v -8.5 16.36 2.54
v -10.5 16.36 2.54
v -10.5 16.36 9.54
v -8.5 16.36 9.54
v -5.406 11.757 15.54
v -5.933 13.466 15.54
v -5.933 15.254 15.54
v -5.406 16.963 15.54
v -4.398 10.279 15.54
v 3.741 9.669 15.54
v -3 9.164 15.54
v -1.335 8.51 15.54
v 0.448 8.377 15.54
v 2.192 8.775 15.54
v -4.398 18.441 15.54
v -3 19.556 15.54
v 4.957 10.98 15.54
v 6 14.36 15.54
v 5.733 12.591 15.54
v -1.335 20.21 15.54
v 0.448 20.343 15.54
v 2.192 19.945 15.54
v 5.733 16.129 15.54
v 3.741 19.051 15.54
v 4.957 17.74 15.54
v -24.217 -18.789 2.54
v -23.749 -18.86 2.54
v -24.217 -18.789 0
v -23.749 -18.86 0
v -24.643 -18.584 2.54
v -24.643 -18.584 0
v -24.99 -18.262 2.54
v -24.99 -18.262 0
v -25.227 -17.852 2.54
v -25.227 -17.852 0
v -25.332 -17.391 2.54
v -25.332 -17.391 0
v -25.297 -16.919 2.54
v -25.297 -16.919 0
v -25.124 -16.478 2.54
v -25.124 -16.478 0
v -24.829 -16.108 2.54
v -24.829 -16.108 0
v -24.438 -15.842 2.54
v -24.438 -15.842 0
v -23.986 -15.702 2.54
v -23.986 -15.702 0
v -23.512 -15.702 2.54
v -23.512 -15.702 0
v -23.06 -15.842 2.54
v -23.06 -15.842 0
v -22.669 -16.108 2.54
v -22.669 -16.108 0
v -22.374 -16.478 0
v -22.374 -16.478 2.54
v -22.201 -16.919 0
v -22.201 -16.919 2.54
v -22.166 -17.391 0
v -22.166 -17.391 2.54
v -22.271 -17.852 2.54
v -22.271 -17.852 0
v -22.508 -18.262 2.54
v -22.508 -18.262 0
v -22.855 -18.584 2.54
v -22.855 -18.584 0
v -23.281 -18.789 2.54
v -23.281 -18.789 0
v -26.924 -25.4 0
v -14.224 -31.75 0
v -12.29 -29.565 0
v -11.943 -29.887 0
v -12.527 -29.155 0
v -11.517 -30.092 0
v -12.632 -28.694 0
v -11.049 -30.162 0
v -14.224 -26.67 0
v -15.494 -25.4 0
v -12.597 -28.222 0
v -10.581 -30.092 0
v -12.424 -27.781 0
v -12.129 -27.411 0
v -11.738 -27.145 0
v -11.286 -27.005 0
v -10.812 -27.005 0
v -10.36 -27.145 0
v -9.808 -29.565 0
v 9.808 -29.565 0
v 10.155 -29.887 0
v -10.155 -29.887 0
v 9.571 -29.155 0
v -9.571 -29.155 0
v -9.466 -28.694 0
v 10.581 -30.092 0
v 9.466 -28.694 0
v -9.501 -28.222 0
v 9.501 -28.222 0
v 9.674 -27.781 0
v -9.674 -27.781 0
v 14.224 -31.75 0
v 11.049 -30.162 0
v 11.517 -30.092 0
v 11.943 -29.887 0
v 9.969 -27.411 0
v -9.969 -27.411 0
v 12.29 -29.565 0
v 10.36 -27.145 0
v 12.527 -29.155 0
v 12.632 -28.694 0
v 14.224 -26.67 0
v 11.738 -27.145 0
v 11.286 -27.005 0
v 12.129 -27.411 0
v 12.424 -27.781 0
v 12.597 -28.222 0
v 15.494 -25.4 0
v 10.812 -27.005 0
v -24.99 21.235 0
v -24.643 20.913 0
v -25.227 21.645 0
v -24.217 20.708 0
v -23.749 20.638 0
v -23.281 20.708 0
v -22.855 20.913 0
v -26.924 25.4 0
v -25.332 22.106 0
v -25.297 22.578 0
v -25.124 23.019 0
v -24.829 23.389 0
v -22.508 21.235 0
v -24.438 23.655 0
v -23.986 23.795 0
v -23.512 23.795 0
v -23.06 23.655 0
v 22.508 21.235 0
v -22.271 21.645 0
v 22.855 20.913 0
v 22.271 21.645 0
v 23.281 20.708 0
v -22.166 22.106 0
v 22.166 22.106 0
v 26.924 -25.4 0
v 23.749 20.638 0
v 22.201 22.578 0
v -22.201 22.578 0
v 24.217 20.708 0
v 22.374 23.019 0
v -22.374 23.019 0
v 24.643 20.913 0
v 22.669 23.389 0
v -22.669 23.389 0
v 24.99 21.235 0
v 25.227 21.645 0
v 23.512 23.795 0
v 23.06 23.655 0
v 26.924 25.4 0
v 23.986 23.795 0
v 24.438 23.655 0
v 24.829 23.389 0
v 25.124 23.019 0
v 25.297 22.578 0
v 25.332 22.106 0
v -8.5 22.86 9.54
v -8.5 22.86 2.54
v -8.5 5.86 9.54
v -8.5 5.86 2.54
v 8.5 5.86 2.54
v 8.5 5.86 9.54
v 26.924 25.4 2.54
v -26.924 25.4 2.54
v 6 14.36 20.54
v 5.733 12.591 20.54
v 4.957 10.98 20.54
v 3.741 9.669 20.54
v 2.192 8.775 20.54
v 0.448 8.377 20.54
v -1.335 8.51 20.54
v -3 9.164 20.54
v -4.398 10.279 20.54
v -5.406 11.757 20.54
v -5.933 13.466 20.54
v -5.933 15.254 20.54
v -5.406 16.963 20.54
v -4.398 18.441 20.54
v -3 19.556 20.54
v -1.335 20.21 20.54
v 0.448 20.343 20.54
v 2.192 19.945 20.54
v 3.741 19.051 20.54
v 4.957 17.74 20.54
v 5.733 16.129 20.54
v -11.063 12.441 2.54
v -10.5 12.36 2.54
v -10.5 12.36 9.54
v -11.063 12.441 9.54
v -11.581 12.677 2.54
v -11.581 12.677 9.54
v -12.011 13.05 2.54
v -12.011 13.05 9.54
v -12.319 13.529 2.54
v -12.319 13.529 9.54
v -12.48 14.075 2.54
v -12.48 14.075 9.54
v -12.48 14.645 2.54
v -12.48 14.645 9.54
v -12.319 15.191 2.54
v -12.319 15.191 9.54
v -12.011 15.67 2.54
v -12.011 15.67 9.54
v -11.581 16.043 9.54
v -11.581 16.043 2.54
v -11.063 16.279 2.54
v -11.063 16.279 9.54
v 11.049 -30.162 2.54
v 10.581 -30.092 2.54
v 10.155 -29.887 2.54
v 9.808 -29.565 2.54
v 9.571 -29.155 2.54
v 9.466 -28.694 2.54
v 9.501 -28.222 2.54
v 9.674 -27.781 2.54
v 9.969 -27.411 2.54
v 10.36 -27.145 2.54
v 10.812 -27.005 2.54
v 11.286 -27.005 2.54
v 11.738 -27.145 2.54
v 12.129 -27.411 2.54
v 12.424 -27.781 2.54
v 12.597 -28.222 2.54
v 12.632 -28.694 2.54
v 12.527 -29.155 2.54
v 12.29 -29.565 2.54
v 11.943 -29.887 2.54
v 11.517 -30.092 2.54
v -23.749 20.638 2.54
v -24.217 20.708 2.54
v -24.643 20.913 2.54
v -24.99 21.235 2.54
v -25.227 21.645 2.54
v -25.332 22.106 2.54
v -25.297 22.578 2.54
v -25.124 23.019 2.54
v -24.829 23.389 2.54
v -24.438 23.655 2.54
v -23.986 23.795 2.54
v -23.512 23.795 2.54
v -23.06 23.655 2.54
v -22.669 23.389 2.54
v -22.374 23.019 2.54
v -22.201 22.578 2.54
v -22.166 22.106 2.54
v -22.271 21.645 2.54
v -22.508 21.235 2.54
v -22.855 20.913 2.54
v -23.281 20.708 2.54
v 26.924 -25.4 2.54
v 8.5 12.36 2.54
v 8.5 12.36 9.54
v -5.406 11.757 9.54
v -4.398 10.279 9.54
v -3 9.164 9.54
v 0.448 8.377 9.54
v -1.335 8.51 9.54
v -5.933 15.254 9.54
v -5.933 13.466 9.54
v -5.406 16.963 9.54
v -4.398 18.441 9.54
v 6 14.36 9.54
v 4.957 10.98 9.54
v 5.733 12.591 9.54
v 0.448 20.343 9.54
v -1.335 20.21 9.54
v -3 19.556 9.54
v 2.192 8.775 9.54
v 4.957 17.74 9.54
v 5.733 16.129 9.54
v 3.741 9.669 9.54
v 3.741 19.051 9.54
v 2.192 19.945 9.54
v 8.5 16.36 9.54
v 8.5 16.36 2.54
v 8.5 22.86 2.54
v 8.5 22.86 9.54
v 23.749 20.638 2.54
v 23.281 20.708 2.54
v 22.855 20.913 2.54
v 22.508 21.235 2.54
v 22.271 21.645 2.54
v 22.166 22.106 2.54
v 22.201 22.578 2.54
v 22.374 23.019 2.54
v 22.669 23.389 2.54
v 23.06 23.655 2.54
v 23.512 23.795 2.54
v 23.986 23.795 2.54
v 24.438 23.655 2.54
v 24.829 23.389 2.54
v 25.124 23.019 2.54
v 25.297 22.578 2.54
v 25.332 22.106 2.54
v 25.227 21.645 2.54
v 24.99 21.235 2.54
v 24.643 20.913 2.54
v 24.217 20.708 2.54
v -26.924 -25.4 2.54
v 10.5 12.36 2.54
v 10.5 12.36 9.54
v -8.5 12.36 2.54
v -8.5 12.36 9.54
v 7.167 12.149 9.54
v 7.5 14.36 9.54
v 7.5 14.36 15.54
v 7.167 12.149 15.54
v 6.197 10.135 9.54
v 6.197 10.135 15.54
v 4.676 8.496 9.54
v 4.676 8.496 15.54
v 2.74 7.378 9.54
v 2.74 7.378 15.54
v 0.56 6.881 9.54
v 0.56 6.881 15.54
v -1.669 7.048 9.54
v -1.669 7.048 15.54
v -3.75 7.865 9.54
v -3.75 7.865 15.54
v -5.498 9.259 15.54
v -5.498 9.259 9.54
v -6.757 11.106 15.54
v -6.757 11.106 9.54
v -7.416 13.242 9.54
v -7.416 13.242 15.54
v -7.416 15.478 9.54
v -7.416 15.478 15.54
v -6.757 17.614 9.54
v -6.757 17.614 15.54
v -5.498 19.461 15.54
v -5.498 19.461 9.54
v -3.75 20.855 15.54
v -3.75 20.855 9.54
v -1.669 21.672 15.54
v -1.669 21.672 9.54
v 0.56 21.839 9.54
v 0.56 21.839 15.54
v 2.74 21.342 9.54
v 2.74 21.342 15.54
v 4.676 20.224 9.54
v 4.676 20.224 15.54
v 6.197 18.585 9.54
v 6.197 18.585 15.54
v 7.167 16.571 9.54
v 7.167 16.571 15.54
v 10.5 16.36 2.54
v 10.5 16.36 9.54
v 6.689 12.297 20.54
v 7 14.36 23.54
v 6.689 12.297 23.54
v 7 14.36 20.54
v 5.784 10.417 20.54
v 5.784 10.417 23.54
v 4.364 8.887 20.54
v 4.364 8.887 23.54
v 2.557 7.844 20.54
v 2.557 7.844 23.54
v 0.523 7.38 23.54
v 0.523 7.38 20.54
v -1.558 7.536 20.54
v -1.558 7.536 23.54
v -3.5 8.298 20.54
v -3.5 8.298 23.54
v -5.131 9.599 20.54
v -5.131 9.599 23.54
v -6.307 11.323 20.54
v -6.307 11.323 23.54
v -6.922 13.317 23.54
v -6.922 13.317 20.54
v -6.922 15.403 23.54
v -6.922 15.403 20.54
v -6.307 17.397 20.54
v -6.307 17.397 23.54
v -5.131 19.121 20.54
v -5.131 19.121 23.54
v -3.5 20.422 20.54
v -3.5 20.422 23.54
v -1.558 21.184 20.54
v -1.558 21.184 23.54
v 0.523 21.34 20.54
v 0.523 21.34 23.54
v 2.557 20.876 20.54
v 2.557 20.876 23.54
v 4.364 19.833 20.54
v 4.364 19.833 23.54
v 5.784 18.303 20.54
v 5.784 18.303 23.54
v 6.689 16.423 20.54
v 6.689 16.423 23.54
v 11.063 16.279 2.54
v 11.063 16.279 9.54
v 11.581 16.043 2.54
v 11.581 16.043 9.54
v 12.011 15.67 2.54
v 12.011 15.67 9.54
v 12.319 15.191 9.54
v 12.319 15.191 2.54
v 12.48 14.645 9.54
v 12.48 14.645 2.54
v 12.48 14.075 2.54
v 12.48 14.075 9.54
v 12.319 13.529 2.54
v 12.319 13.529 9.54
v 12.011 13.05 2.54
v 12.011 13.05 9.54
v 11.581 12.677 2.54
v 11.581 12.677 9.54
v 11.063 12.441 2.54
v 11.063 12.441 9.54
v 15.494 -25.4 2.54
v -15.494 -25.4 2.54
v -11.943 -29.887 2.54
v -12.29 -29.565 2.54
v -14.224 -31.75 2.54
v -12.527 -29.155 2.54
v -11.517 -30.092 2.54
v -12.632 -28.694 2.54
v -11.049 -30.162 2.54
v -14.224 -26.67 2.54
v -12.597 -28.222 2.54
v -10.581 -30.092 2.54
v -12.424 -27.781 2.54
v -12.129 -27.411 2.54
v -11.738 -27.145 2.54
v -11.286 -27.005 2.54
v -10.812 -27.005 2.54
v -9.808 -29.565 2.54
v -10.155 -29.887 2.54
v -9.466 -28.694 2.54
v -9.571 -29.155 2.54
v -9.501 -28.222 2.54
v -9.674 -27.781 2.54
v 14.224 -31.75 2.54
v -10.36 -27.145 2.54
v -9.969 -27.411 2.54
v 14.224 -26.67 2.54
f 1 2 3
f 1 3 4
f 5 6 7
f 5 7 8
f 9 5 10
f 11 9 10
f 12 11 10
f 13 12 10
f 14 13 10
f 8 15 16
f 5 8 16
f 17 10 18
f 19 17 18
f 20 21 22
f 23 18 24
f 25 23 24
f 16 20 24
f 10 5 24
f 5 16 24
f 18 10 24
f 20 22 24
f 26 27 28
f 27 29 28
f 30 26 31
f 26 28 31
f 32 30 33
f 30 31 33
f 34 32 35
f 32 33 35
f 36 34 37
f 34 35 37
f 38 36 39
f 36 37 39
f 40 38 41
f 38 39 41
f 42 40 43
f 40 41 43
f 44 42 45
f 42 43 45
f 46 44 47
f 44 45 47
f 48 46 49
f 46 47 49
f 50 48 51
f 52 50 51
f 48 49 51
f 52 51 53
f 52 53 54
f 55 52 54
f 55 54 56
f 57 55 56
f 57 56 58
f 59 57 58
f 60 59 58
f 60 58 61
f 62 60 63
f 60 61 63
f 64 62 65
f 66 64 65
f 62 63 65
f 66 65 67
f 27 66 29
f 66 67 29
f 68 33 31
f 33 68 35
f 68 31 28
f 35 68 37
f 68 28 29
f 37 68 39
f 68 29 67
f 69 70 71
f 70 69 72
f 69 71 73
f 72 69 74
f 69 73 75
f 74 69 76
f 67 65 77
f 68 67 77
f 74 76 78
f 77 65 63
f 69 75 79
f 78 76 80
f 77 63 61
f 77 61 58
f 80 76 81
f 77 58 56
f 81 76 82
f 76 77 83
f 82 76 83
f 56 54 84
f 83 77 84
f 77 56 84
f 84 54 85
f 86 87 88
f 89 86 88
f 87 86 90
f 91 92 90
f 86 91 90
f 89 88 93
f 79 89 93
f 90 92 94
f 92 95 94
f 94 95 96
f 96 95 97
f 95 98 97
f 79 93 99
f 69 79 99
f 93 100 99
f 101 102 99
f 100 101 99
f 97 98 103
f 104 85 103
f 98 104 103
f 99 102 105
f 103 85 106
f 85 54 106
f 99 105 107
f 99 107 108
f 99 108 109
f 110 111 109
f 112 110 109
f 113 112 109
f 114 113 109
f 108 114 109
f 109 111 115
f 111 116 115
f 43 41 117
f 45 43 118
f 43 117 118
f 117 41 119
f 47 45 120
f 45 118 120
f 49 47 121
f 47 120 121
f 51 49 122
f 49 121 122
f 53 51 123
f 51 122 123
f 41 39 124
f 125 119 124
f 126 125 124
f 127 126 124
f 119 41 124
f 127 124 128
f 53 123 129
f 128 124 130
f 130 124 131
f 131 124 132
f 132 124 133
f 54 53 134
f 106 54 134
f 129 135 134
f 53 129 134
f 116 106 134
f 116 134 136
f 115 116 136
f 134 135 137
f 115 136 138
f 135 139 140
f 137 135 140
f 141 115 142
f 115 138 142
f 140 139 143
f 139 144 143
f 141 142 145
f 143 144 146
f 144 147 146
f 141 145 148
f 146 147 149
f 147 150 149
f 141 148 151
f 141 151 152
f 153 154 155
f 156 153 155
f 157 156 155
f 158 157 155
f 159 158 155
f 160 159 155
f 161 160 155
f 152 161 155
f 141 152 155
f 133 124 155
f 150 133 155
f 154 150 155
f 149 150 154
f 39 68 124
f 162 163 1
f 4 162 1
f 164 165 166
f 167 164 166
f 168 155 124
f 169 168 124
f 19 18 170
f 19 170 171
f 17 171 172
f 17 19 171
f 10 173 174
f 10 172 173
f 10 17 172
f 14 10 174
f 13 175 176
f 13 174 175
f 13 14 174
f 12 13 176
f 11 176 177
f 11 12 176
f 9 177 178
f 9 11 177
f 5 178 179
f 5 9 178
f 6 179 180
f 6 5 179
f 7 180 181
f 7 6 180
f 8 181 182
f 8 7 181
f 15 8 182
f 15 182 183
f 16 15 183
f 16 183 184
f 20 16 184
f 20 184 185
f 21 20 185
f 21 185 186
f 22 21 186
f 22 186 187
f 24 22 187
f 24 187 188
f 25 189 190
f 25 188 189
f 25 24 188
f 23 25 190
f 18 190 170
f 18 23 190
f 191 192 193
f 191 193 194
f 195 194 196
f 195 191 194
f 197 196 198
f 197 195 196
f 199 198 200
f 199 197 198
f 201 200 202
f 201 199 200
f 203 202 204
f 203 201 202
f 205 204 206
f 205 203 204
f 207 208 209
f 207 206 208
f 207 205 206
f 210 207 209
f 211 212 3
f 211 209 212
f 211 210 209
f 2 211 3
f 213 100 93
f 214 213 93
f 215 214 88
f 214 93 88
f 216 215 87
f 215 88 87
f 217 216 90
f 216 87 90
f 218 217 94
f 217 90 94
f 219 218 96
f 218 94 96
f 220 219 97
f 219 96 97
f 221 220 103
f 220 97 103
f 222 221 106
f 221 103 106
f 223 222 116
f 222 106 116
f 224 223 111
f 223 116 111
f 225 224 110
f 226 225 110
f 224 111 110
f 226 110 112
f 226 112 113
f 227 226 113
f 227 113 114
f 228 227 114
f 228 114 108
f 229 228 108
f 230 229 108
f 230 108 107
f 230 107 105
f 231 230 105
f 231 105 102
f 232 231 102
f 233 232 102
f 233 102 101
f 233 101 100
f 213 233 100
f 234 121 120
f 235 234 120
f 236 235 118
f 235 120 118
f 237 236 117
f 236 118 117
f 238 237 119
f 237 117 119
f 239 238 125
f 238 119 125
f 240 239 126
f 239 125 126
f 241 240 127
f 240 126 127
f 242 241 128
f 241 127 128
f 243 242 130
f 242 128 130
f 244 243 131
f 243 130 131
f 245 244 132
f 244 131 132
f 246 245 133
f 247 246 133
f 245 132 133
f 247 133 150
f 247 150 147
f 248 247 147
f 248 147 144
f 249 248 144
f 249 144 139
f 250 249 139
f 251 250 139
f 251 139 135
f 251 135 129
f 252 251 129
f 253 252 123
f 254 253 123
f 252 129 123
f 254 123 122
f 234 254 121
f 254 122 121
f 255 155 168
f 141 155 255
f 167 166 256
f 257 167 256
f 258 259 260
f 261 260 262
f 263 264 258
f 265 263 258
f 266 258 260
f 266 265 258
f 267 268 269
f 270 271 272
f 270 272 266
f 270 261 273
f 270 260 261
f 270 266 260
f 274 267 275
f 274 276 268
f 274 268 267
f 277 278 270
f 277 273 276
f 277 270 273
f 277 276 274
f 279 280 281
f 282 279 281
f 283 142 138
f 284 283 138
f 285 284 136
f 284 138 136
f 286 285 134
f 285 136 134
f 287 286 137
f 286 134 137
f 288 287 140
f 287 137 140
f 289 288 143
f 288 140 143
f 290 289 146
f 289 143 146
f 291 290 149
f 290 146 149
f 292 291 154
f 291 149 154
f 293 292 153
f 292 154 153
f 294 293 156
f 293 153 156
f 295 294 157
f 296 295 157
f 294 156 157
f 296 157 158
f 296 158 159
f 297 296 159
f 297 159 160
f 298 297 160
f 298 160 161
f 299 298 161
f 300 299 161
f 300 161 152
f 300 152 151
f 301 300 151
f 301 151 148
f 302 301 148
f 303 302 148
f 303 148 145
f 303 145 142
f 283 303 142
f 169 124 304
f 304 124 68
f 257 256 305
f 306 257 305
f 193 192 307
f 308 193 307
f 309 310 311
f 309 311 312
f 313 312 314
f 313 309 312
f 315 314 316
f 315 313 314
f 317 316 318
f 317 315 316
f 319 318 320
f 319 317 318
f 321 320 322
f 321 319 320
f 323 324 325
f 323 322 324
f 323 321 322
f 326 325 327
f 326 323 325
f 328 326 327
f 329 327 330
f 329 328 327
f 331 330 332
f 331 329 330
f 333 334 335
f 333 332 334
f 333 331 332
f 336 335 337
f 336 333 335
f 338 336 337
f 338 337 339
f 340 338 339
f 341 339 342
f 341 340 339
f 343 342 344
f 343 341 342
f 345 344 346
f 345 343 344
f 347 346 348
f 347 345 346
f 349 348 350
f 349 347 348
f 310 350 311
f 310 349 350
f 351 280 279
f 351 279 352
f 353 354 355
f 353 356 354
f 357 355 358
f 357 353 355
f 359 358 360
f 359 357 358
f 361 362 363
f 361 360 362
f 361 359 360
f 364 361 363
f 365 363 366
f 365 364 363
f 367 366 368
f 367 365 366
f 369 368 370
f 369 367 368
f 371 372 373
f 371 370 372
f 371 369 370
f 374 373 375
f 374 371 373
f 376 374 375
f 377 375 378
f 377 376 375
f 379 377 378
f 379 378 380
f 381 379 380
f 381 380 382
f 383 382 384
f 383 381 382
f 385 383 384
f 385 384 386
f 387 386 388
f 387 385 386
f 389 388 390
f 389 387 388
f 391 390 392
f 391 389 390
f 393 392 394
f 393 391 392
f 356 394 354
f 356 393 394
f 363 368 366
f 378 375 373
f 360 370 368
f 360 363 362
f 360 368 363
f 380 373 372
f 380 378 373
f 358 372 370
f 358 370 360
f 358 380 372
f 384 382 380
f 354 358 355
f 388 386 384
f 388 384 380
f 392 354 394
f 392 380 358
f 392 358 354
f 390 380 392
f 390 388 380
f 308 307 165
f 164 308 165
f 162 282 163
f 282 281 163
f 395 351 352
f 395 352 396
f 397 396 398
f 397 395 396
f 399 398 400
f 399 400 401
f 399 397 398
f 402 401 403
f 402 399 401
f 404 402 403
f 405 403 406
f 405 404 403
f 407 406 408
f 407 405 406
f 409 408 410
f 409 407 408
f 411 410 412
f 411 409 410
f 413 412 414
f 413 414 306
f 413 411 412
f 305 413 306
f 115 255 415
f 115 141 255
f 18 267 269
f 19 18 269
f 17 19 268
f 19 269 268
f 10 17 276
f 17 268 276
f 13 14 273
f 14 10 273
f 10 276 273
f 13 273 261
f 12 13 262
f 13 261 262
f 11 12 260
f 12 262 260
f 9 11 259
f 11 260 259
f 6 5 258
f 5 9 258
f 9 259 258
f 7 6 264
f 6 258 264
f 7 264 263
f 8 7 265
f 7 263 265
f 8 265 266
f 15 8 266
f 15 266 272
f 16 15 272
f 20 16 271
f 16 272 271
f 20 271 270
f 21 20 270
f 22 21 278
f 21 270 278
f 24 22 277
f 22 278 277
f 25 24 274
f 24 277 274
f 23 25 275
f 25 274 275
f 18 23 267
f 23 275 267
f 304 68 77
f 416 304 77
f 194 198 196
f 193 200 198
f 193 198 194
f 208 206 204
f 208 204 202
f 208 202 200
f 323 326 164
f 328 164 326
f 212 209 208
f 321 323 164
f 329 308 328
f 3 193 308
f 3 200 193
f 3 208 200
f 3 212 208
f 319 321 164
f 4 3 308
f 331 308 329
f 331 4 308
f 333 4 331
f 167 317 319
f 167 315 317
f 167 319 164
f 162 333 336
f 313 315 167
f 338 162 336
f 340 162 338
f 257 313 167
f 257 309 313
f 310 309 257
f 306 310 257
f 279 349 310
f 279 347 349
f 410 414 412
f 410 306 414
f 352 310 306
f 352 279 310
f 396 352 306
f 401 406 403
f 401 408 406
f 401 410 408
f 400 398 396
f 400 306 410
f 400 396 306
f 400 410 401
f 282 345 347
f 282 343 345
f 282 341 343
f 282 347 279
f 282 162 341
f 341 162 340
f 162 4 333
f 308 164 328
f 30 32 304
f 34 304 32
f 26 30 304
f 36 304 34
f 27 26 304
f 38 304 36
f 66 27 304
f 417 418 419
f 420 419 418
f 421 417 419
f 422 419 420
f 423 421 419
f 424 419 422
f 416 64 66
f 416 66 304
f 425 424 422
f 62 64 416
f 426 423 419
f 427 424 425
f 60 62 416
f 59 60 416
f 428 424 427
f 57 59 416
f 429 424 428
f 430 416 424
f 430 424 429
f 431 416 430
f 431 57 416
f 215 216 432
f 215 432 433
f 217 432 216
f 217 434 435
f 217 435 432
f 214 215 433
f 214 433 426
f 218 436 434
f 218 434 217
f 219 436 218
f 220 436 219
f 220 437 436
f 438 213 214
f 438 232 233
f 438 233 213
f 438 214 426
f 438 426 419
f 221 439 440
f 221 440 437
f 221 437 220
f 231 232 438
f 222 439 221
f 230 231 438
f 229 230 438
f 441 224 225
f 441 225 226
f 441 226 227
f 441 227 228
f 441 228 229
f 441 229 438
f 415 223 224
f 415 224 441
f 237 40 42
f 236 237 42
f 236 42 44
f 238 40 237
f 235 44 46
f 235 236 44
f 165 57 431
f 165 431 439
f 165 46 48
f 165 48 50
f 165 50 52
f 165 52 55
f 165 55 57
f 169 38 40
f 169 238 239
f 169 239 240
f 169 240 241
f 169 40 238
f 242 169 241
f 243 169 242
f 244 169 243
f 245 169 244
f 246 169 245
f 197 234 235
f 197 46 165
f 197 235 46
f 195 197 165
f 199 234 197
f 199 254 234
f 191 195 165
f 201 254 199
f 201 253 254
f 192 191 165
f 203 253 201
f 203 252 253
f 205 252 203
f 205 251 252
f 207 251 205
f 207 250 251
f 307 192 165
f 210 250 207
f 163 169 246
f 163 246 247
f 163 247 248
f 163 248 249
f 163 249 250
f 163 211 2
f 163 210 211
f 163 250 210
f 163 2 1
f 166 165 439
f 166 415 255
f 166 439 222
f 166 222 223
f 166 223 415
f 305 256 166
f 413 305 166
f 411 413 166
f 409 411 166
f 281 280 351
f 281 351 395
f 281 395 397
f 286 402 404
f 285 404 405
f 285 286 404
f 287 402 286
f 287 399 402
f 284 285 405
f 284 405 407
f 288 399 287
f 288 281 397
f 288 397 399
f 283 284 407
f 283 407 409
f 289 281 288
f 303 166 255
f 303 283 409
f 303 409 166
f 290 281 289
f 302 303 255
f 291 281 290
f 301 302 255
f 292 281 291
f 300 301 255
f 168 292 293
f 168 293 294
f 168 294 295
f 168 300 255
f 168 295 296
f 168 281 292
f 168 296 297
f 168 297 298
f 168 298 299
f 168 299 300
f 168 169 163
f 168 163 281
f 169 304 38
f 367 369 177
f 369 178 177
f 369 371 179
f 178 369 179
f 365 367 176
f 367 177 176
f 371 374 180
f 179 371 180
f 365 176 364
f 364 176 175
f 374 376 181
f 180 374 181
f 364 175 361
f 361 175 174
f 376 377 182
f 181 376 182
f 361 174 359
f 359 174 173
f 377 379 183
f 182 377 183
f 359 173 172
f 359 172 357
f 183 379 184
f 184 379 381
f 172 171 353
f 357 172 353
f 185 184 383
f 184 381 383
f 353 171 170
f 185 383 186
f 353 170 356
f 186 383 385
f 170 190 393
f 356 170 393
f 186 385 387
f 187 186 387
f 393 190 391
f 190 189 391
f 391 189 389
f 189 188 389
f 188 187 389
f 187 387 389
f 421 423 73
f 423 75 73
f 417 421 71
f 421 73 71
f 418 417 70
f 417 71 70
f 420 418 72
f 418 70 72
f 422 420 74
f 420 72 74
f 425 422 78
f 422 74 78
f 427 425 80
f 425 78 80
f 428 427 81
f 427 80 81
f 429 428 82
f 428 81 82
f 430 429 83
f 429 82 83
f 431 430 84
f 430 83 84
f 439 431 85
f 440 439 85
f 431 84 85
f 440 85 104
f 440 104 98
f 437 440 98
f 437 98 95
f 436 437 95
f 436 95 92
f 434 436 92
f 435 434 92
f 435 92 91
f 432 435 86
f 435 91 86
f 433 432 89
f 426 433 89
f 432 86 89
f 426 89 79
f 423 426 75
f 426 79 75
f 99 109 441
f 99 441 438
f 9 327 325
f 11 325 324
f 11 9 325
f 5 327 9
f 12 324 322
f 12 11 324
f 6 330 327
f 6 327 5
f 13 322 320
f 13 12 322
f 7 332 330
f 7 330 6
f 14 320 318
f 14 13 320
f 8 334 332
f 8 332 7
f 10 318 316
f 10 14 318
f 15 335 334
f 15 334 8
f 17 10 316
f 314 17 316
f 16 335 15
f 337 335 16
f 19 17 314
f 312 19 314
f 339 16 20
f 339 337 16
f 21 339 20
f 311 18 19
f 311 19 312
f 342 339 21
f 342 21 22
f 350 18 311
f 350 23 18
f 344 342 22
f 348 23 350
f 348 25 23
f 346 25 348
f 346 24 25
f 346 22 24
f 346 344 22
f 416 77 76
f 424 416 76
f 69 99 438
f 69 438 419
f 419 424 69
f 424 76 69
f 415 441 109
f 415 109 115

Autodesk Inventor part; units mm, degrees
ref_plane "YZ Plane" through (0, 0, 0) normal (1, 0, 0) x (0, 1, 0)
ref_plane "XZ Plane" through (0, 0, 0) normal (0, 1, 0) x (-1, 0, 0)
ref_plane "XY Plane" through (0, 0, 0) normal (0, 0, 1) x (1, 0, 0)
sketch "Sketch1" plane through (0, 0, 0) normal (0, 0, 1) x (1, 0, 0)
  line L0 (26.924, 25.4) -> (26.924, -25.4)
  line L1 (26.924, -25.4) -> (15.494, -25.4)
  line L2 (14.224, -26.67) -> (14.224, -31.75)
  line L3 (14.224, -31.75) -> (0, -31.75)
  line L4 (26.924, 25.4) -> (0, 25.4)
  line L5 (-26.924, 25.4) -> (-26.924, -25.4)
  line L6 (-26.924, -25.4) -> (-15.494, -25.4)
  line L7 (-14.224, -26.67) -> (-14.224, -31.75)
  line L8 (-14.224, -31.75) -> (0, -31.75)
  line L9 (-26.924, 25.4) -> (0, 25.4)
  line L10 (-15.494, -25.4) -> (-14.224, -26.67)
  line L11 (14.224, -26.67) -> (15.494, -25.4)
  point P0 (0, 0)
  point P1 (14.224, -25.4)
  point P2 (-14.224, -25.4)
extrude "Extrusion1" add sketch "Sketch1" along normal blind 2.54
sketch "Sketch2" plane through (0, 0, 2.54) normal (0, 0, 1) x (1, 0, 0)
  point P0 (0, 0)
  point P1 (26.924, 25.4)
  point P2 (-23.749, 22.225)
  point P3 (23.749, 22.225)
  point P4 (-23.749, -17.272)
  point P5 (-11.049, -28.575)
  point P6 (11.049, -28.575)
hole "Hole1" at (-23.749, 22.225, 2.54) at (23.749, 22.225, 2.54) at (-23.749, -17.272, 2.54) at (-11.049, -28.575, 2.54) at (11.049, -28.575, 2.54) direction (0, 0, -1) diameter 3.175 end through all
sketch "Sketch3" plane through (0, 0, 2.54) normal (0, 0, 1) x (1, 0, 0)
  line L0 (26.924, 25.4) -> (-26.924, 25.4) projected
  line L1 (0, 25.4) -> (0, 22.86)
  line L2 (0, 22.86) -> (0, 14.36)
  line L3 (-8.5, 5.86) -> (8.5, 5.86)
  line L4 (8.5, 5.86) -> (8.5, 22.86)
  line L5 (8.5, 22.86) -> (-8.5, 22.86)
  line L6 (-8.5, 22.86) -> (-8.5, 5.86)
  line L7 (-8.5, 5.86) -> (8.5, 22.86) construction
  line L8 (8.5, 5.86) -> (-8.5, 22.86) construction
  point P0 (0, 0)
  dimension "d27" = 2.54
  dimension "d28" = 8.5
  dimension "d29" = 17
extrude "Extrusion2" add sketch "Sketch3" along normal blind 7
sketch "Sketch4" plane through (0, 0, 9.54) normal (0, 0, 1) x (1, 0, 0)
  circle A0 centre (0, 14.36) radius 7.5
  circle A1 centre (0, 14.36) radius 6
  point P0 (0, 0)
  dimension "d32" = 15
  dimension "d33" = 12
extrude "Extrusion3" add sketch "Sketch4" along normal blind 6
sketch "Sketch5" plane through (0, 14.36, 15.54) normal (0, 0, 1) x (1, 0, 0)
  circle A0 centre (0, 0) radius 6
  point P0 (0, -14.36)
extrude "Extrusion4" add sketch "Sketch5" along normal blind 5
sketch "Sketch6" plane through (0, 14.36, 20.54) normal (0, 0, 1) x (1, 0, 0)
  circle A0 centre (0, 0) radius 7
  point P0 (0, -14.36)
  dimension "d38" = 14
extrude "Extrusion5" add sketch "Sketch6" along normal blind 3
sketch "Sketch7" plane through (0, 0, 2.54) normal (0, 0, 1) x (1, 0, 0)
  line L0 (-8.5, 22.86) -> (-8.5, 5.86) projected
  line L1 (-8.5, 14.36) -> (-10.5, 14.36)
  circle A0 centre (-10.5, 14.36) radius 2
  line L2 (-10.5, 16.36) -> (-8.5, 16.36)
  line L3 (-10.5, 12.36) -> (-8.5, 12.36)
  point P0 (0, 0)
  dimension "d41" = 2
extrude "Extrusion6" add sketch "Sketch7" along normal up to surface (7 mm away)
mirror "Mirror1" about plane through (0, 0, 0) normal (1, 0, 0) of "Extrusion6"
properties part number "pixy-cam"
